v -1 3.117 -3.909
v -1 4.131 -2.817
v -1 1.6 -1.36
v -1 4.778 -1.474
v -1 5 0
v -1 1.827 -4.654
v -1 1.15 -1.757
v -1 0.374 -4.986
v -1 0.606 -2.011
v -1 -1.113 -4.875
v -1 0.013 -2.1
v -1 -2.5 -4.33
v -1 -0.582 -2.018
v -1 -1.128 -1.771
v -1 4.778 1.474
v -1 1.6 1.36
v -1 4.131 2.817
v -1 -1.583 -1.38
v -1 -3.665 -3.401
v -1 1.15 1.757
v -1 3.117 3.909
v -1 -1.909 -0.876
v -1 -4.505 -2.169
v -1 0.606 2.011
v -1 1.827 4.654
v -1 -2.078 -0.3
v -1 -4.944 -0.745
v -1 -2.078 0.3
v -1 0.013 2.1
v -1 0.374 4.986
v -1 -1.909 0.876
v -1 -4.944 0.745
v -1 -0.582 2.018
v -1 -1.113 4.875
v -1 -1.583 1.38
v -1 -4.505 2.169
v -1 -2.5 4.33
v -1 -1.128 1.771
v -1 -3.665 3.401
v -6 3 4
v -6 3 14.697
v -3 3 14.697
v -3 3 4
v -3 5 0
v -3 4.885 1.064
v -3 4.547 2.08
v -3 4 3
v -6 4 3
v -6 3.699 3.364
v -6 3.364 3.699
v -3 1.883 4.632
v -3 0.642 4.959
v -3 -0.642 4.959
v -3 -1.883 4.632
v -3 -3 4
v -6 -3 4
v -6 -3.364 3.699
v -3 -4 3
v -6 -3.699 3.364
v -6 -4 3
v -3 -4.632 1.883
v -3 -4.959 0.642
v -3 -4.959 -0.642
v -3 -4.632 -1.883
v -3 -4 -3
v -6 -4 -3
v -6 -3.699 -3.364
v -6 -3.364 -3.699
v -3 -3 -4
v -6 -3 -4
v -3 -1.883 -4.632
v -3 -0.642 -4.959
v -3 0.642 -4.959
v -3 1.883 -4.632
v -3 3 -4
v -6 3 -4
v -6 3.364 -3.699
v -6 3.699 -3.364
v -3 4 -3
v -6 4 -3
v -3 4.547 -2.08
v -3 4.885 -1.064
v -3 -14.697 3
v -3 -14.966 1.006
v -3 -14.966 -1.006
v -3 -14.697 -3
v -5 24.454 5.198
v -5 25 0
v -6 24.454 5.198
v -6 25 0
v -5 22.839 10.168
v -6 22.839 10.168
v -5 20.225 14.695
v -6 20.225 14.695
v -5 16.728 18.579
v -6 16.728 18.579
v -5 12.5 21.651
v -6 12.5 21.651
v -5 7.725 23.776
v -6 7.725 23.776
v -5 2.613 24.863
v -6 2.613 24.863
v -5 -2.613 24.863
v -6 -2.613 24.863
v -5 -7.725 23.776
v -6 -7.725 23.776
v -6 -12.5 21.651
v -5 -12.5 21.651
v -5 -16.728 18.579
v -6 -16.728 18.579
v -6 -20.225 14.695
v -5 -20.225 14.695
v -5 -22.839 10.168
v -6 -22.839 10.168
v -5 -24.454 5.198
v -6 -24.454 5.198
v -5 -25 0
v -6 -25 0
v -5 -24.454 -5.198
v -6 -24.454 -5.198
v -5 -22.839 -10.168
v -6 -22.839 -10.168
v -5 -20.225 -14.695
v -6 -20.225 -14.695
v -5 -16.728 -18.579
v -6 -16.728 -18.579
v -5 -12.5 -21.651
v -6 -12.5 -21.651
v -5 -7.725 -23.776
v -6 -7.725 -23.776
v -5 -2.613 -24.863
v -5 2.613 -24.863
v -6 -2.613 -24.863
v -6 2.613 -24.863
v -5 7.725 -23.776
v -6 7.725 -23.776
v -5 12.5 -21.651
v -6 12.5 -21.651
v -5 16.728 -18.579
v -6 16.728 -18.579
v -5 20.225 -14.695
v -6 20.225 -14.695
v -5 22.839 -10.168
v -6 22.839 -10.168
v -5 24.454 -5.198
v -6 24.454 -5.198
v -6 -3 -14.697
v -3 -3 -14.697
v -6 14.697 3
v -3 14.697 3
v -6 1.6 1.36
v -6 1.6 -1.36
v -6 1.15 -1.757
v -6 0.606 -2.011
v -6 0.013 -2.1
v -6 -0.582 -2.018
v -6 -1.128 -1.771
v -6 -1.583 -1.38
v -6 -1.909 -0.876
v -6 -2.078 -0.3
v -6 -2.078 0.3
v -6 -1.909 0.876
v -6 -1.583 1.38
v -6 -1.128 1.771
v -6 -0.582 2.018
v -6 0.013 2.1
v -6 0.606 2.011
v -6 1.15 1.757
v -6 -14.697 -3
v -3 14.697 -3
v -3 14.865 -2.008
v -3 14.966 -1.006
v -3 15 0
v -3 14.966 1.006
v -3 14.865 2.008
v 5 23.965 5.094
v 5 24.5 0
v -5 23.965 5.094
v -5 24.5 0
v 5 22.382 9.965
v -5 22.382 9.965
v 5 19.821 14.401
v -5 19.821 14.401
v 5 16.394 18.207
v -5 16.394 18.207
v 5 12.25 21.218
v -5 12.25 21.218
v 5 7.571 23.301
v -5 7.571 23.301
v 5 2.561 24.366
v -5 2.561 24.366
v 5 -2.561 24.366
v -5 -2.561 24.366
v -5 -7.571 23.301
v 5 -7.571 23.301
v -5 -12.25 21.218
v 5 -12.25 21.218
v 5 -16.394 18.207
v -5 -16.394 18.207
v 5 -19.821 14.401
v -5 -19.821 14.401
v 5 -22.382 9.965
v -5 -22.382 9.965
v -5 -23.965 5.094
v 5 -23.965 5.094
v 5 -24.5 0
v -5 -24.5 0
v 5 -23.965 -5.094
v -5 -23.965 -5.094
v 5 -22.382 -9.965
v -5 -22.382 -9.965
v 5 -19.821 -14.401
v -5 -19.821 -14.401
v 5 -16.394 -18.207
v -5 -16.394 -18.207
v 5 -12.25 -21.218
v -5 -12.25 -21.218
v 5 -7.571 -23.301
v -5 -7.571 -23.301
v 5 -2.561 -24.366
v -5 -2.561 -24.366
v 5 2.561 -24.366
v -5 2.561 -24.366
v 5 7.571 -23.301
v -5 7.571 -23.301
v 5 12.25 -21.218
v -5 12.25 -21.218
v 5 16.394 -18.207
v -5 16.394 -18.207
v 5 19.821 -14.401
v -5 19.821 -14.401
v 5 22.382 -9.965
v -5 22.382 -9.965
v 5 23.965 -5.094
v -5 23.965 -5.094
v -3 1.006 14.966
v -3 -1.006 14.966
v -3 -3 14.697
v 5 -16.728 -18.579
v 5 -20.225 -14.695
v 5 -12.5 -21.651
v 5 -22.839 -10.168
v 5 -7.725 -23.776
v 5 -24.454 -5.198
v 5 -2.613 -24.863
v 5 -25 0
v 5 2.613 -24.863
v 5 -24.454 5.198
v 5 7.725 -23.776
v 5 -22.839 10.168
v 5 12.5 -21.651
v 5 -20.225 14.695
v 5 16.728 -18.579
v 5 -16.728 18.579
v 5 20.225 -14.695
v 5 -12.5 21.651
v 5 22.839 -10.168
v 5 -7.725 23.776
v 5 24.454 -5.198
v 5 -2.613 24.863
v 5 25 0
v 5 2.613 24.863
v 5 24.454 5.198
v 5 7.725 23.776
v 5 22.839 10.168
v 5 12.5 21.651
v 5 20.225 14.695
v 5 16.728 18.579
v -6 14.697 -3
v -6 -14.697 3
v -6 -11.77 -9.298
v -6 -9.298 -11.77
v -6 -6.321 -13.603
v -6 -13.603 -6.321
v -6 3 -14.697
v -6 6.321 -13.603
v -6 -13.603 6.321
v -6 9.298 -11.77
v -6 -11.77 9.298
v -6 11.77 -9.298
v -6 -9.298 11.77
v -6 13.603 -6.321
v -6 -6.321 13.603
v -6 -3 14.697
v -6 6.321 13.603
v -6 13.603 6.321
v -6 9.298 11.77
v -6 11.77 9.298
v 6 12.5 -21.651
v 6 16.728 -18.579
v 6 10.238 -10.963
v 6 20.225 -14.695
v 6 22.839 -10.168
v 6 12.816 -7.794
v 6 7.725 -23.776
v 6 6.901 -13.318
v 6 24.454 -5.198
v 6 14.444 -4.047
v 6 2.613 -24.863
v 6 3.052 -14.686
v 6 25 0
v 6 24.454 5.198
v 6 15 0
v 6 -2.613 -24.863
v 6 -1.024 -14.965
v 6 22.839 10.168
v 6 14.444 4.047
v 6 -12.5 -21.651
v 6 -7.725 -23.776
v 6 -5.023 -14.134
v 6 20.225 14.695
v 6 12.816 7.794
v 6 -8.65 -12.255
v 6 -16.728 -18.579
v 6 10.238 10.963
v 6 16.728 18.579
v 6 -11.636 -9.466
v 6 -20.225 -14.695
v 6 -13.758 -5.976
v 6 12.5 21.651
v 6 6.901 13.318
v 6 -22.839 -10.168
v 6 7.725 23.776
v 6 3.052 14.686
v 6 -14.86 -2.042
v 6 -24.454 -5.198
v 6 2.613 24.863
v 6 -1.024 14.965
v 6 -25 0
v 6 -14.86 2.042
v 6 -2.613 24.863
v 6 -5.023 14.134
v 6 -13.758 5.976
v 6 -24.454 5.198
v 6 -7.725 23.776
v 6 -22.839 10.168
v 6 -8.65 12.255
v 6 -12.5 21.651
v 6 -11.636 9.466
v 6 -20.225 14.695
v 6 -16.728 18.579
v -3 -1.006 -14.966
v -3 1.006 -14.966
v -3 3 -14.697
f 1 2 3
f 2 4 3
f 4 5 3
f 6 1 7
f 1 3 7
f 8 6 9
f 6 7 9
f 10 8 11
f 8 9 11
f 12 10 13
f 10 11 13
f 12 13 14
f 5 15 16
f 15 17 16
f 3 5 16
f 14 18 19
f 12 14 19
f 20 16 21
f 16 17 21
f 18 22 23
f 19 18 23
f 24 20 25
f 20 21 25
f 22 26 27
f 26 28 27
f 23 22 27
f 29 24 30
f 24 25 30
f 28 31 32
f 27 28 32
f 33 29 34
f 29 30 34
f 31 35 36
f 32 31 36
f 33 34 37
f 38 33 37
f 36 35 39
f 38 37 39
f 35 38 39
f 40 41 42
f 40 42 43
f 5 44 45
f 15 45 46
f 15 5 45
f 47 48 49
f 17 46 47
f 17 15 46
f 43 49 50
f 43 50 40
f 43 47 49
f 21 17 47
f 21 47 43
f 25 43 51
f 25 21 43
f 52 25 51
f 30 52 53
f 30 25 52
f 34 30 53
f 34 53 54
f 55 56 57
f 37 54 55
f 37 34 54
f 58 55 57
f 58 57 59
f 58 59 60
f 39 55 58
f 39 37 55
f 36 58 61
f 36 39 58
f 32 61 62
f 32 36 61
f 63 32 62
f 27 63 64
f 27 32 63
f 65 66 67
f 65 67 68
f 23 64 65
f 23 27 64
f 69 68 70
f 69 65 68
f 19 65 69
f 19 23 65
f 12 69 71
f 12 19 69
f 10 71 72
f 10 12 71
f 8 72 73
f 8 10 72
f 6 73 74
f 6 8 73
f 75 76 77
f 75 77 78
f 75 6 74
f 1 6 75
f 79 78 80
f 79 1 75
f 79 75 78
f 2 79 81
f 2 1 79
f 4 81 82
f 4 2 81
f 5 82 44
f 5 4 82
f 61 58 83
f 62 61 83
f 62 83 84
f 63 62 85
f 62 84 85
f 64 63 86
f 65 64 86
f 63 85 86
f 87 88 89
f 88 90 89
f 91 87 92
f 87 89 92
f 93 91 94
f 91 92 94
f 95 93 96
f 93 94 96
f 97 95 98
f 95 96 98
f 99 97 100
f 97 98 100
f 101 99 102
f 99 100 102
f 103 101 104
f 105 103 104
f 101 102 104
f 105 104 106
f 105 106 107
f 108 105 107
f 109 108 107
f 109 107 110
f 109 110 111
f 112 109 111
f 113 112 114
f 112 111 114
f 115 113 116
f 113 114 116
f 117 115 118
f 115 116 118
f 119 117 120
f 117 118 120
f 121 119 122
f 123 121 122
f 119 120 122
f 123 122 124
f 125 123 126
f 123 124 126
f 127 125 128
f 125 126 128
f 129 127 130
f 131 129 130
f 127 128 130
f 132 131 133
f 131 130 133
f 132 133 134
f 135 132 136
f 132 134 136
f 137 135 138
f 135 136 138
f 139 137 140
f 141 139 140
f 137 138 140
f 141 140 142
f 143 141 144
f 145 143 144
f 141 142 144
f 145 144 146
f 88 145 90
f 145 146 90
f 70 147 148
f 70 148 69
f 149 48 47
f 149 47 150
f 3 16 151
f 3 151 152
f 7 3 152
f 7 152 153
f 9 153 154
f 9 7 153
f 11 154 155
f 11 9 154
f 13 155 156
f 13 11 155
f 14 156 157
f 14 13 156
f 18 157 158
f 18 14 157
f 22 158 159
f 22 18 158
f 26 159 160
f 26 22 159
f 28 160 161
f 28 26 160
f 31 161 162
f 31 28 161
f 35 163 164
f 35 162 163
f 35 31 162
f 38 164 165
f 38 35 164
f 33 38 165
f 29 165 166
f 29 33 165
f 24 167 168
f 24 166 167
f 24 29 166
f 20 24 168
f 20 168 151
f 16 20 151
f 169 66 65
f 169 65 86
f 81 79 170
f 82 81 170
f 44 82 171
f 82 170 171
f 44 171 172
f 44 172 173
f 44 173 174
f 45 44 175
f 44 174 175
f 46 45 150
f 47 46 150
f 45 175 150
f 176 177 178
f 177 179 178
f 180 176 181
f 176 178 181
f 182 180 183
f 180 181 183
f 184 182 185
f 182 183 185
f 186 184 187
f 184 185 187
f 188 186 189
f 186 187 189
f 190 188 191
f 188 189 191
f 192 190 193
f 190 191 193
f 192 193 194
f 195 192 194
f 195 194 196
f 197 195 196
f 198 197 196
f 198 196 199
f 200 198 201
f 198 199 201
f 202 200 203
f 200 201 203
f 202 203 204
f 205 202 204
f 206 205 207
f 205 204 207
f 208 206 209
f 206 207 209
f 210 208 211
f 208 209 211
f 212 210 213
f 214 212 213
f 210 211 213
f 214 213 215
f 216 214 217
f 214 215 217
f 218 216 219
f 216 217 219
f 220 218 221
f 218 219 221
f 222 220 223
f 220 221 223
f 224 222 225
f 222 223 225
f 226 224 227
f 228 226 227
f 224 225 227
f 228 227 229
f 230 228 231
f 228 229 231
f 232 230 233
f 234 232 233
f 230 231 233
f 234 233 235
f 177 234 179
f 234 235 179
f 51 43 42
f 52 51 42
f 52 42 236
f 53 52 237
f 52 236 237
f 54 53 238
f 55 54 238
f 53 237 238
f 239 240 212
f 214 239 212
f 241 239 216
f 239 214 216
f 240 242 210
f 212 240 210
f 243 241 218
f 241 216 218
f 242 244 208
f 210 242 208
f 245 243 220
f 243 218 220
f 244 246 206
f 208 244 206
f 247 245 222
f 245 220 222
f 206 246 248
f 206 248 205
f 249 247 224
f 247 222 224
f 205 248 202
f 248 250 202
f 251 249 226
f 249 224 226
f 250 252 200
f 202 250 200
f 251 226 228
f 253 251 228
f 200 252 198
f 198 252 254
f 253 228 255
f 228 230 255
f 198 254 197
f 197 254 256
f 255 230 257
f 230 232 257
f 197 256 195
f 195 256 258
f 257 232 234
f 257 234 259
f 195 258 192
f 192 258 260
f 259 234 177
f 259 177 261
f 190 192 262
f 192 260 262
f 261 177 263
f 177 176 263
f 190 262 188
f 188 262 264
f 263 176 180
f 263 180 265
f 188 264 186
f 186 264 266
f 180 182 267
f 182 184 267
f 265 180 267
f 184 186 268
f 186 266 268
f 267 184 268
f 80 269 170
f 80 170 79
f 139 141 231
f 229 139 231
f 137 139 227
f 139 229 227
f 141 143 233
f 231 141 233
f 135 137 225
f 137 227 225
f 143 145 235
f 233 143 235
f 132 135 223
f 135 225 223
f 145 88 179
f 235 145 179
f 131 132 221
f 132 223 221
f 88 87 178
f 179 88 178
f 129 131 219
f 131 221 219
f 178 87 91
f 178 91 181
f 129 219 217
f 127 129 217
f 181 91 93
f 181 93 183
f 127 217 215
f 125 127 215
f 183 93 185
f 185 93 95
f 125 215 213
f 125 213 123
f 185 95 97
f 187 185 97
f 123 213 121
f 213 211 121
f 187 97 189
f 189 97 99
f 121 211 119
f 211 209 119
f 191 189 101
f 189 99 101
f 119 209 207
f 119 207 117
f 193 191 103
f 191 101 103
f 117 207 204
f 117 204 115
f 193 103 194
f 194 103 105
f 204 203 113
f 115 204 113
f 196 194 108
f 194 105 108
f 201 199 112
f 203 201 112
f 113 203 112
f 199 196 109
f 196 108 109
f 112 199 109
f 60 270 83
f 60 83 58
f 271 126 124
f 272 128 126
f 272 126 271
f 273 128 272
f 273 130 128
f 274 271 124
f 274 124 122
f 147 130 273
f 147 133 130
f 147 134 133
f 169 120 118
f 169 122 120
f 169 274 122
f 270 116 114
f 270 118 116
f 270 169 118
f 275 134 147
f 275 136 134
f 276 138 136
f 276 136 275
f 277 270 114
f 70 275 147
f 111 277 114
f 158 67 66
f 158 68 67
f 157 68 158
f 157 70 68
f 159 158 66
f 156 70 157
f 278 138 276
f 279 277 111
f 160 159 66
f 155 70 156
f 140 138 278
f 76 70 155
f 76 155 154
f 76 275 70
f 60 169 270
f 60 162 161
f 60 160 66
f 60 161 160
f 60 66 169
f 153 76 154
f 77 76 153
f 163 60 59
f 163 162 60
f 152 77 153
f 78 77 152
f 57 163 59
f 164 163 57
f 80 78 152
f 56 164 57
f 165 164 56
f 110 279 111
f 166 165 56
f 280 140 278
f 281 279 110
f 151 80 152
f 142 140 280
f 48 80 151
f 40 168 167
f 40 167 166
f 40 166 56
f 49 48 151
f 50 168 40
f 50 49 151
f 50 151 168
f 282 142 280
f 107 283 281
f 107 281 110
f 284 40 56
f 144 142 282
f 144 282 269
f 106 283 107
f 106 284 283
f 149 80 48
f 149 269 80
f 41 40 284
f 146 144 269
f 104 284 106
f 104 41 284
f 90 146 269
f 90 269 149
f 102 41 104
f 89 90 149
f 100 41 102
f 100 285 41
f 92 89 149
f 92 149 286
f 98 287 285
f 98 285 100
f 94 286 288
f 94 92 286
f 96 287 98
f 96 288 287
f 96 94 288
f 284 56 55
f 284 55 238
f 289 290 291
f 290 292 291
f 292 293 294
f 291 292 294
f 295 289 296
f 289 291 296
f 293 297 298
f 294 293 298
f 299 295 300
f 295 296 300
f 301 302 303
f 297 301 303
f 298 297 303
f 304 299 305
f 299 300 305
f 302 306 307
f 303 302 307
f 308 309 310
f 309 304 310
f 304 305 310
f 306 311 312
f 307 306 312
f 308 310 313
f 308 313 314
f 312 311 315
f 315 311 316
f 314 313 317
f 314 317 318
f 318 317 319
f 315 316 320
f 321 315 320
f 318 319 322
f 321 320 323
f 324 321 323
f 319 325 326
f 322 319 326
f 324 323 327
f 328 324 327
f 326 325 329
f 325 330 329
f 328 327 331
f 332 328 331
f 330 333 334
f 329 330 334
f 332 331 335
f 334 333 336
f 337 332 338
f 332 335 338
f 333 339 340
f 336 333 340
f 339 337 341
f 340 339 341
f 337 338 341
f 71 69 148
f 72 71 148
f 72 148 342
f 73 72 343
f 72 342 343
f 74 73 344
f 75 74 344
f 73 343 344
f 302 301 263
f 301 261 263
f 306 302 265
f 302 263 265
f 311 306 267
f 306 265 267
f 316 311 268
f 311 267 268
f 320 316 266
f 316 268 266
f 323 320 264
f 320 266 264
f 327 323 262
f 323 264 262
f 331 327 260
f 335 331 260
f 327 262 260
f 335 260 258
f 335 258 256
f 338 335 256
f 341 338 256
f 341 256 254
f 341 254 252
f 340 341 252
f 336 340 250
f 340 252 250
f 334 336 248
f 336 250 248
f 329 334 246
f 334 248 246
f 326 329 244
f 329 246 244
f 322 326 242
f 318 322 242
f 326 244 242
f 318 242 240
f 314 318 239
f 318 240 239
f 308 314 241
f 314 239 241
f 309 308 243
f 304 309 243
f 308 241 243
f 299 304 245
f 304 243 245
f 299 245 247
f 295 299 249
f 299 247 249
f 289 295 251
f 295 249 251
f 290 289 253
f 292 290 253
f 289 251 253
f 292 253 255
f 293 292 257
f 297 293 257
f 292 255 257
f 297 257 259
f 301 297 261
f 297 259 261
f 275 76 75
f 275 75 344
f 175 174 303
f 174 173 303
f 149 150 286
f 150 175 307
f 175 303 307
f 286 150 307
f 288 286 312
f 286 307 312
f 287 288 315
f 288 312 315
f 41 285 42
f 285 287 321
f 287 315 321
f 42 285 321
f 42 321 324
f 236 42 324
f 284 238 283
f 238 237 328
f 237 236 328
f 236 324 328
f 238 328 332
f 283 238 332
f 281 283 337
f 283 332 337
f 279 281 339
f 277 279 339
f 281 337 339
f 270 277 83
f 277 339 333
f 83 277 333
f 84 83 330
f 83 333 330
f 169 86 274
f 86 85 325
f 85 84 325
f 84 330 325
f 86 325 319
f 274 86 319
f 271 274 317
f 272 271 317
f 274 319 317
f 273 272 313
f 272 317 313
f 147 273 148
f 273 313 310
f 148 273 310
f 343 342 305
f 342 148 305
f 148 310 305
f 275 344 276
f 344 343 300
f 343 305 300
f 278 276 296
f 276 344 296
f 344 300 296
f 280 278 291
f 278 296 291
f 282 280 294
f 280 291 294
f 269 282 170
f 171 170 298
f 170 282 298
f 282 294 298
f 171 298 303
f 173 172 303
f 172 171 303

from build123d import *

# Parameters (mm, degrees)
SKETCH1_W               = 5
SKETCH1_H               = 5
BOSS_EXTRUDE1_DEPTH     = 3
CUT_EXTRUDE1_DEPTH      = 8
CUT_EXTRUDE1_DEPTH_BACK = 6
CIRPATTERN1_COUNT       = 4


with BuildPart() as part:
    # Sketch1 → Revolve1 (revolve)
    with BuildSketch(Plane.XY):
        Polygon((-6, 25), (-6, 15), (6, 15), (6, 25), (5, 25), (5, 24.5), (-5, 24.5), (-5, 25), align=None)
        with Locations((-3.5, 2.5)):
            Rectangle(SKETCH1_W, SKETCH1_H)
    revolve(axis=Axis((0, 0, 0), (1, 0, 0)))

    # Sketch2 → Boss-Extrude1 (add)
    with BuildSketch(Plane(origin=(-6, 0, 0), x_dir=(0, 0, -1), z_dir=(1, 0, 0))):
        with BuildLine():
            Line((-3, 4), (-3, 14.696938457))
            ThreePointArc((-3, 14.696938457), (0, 15), (3, 14.696938457))
            Line((3, 14.696938457), (3, 4))
            ThreePointArc((3, 4), (0, 5), (-3, 4))
        make_face()
    boss_extrude1 = extrude(amount=BOSS_EXTRUDE1_DEPTH)

    # Sketch3 → Cut-Extrude1 (cut, two sides)
    with BuildSketch(Plane(origin=(-1, 0, 0), x_dir=(0, 0, -1), z_dir=(1, 0, 0))) as cut_extrude1_sk:
        with BuildLine():
            Line((-1.360147051, 1.6), (1.360147051, 1.6))
            ThreePointArc((1.360147051, 1.6), (0, -2.1), (-1.360147051, 1.6))
        make_face()
    extrude(amount=CUT_EXTRUDE1_DEPTH, mode=Mode.SUBTRACT)
    extrude(cut_extrude1_sk.sketch, amount=-CUT_EXTRUDE1_DEPTH_BACK, mode=Mode.SUBTRACT)

    # CirPattern1: Boss-Extrude1 ×4 about axis
    cirpattern1_axis = Axis((0, 0, 0), (1, 0, 0))
    for i in range(1, CIRPATTERN1_COUNT):
        add(boss_extrude1.rotate(cirpattern1_axis, i * 360 / CIRPATTERN1_COUNT))


solid = part.part
